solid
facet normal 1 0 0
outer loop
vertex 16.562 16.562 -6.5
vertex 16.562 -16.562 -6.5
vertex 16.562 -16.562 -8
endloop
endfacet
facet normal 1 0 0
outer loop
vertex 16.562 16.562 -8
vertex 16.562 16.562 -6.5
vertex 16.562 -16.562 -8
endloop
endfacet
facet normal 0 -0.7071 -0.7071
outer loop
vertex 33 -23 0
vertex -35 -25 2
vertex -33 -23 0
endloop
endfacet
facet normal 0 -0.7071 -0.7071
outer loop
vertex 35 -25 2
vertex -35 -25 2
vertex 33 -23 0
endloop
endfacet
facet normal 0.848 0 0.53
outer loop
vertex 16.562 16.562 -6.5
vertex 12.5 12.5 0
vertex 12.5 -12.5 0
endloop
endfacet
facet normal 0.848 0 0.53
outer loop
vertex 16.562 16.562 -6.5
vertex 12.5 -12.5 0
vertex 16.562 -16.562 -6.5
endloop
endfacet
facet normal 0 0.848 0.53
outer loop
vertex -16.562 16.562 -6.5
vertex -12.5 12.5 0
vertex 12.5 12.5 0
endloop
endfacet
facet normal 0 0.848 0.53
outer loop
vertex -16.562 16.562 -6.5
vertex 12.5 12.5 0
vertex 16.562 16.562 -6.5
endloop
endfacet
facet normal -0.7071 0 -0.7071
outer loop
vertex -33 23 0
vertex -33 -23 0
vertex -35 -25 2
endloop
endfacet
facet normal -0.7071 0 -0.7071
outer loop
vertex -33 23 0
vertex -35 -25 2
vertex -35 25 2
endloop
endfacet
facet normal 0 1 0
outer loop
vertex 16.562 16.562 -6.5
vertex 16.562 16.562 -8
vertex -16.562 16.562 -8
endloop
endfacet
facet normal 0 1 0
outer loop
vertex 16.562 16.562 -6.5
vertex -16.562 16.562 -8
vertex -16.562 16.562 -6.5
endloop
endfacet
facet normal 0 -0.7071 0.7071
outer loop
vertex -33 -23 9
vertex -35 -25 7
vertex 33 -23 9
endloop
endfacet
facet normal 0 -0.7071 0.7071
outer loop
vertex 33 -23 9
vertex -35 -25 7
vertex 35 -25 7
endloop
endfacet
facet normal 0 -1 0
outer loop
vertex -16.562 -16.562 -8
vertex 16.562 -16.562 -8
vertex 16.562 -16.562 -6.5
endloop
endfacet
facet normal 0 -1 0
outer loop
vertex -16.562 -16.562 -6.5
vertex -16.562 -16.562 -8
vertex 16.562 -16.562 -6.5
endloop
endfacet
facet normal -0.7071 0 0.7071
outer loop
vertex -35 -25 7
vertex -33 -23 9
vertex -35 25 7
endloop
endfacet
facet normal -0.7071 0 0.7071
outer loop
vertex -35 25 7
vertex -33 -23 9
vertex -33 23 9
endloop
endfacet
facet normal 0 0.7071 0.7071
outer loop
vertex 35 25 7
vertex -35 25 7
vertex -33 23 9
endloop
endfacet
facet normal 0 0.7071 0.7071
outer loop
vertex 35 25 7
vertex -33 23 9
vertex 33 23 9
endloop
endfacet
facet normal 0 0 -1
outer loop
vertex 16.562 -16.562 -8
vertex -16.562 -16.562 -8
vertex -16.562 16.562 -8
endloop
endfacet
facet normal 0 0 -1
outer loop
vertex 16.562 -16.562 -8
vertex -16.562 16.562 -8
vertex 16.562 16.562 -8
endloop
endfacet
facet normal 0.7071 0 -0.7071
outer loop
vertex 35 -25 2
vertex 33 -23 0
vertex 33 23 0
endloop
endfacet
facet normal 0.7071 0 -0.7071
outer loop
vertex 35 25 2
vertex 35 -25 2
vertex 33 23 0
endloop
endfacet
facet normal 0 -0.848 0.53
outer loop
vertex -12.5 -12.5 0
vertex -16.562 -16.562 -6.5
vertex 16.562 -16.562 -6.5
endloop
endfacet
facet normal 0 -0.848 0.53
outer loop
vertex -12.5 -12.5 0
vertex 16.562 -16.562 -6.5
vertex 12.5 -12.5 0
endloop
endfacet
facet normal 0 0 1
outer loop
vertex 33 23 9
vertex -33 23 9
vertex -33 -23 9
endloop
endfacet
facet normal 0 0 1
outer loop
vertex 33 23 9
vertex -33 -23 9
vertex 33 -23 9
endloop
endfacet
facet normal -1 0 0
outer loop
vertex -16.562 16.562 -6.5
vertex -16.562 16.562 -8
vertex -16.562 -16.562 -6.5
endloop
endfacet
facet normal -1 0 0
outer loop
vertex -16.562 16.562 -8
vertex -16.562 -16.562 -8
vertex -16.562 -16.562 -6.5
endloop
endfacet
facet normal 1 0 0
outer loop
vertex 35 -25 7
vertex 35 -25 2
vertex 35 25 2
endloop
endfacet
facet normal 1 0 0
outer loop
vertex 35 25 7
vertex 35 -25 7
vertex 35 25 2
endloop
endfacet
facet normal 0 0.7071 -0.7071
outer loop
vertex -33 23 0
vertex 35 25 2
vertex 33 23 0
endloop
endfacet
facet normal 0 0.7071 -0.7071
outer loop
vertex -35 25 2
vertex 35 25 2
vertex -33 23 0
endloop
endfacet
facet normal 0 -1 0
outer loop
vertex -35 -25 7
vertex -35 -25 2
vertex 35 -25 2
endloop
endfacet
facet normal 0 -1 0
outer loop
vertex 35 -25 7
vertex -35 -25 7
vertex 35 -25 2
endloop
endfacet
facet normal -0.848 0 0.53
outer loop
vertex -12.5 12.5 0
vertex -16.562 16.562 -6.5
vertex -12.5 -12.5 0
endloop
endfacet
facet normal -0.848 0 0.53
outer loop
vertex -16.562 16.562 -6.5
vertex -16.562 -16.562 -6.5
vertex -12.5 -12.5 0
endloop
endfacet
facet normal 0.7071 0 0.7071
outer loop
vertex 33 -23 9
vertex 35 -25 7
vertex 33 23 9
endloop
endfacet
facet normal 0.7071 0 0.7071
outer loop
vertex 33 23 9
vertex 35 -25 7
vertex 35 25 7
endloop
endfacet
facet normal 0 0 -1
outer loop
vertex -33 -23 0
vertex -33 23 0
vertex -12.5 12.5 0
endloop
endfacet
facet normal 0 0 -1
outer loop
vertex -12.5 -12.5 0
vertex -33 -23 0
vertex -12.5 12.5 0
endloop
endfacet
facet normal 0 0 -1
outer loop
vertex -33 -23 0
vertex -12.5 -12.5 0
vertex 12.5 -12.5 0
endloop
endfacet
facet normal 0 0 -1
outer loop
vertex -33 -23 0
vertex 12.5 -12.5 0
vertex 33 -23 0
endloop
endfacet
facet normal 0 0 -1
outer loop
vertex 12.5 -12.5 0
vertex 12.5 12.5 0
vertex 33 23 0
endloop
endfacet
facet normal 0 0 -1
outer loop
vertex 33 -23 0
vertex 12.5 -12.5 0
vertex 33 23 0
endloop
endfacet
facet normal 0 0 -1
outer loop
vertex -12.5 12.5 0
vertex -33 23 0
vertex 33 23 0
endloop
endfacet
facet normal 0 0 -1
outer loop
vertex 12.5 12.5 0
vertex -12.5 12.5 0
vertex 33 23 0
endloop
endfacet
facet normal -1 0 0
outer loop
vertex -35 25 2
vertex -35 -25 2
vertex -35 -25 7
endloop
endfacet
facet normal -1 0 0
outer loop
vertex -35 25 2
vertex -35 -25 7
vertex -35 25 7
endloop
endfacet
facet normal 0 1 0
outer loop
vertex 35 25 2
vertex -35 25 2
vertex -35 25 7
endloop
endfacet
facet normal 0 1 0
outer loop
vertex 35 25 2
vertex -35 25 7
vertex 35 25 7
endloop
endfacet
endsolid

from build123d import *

# Parameters (mm, degrees)
F0_W          = 70
F0_H          = 50
F1_DEPTH      = 9
F2_W          = 35
F2_H          = 35
F3_DEPTH      = 8
F5_DEPTH      = 25
F5_DEPTH_BACK = 25
F6_W          = 0.9375
F6_H          = 1.5
F7_DEPTH      = 25
F7_DEPTH_BACK = 25
F8_SIZE       = 2


with BuildPart() as f1:
    # F0 (on Top) → F1 (new body)
    with BuildSketch(Plane.XY):
        Rectangle(F0_W, F0_H)
    extrude(amount=F1_DEPTH)

    # F2 (on face) → F3 (join)
    with BuildSketch(Plane(origin=(0, 0, 0), x_dir=(1, 0, 0), z_dir=(0, 0, -1))):
        Rectangle(F2_W, F2_H)
    extrude(amount=F3_DEPTH)

    # F4 (on Front) → F5 (cut, two sides)
    with BuildSketch(Plane.XZ) as f5_sk:
        Polygon((12.5, 0), (16.5625, -6.5), (16.5625, -8), (17.5, -8), (17.5, 0), align=None)
        Polygon((-16.5625, -6.5), (-12.5, 0), (-17.5, 0), (-17.5, -8), (-16.5625, -8), align=None)
    extrude(amount=-F5_DEPTH, mode=Mode.SUBTRACT)
    extrude(f5_sk.sketch, amount=F5_DEPTH_BACK, mode=Mode.SUBTRACT)

    # F6 (on Right) → F7 (cut, two sides)
    with BuildSketch(Plane.YZ) as f7_sk:
        Polygon((17.5, 0), (12.5, 0), (16.5625, -6.5), (17.5, -6.5), align=None)
        with Locations((17.03125, -7.25)):
            Rectangle(F6_W, F6_H)
        Polygon((-17.5, 0), (-17.5, -8), (-16.5625, -8), (-16.5625, -6.5), (-12.5, 0), align=None)
    extrude(amount=-F7_DEPTH, mode=Mode.SUBTRACT)
    extrude(f7_sk.sketch, amount=F7_DEPTH_BACK, mode=Mode.SUBTRACT)

    # F8
    f8_edges = [f1.edges().sort_by_distance(p)[0] for p in [
        (35, 0, 9),
        (0, 25, 9),
        (-35, 0, 9),
        (0, -25, 9),
        (0, -25, 0),
        (35, 0, 0),
        (0, 25, 0),
        (-35, 0, 0),
    ]]
    chamfer(f8_edges, length=F8_SIZE)


solid = f1.part
